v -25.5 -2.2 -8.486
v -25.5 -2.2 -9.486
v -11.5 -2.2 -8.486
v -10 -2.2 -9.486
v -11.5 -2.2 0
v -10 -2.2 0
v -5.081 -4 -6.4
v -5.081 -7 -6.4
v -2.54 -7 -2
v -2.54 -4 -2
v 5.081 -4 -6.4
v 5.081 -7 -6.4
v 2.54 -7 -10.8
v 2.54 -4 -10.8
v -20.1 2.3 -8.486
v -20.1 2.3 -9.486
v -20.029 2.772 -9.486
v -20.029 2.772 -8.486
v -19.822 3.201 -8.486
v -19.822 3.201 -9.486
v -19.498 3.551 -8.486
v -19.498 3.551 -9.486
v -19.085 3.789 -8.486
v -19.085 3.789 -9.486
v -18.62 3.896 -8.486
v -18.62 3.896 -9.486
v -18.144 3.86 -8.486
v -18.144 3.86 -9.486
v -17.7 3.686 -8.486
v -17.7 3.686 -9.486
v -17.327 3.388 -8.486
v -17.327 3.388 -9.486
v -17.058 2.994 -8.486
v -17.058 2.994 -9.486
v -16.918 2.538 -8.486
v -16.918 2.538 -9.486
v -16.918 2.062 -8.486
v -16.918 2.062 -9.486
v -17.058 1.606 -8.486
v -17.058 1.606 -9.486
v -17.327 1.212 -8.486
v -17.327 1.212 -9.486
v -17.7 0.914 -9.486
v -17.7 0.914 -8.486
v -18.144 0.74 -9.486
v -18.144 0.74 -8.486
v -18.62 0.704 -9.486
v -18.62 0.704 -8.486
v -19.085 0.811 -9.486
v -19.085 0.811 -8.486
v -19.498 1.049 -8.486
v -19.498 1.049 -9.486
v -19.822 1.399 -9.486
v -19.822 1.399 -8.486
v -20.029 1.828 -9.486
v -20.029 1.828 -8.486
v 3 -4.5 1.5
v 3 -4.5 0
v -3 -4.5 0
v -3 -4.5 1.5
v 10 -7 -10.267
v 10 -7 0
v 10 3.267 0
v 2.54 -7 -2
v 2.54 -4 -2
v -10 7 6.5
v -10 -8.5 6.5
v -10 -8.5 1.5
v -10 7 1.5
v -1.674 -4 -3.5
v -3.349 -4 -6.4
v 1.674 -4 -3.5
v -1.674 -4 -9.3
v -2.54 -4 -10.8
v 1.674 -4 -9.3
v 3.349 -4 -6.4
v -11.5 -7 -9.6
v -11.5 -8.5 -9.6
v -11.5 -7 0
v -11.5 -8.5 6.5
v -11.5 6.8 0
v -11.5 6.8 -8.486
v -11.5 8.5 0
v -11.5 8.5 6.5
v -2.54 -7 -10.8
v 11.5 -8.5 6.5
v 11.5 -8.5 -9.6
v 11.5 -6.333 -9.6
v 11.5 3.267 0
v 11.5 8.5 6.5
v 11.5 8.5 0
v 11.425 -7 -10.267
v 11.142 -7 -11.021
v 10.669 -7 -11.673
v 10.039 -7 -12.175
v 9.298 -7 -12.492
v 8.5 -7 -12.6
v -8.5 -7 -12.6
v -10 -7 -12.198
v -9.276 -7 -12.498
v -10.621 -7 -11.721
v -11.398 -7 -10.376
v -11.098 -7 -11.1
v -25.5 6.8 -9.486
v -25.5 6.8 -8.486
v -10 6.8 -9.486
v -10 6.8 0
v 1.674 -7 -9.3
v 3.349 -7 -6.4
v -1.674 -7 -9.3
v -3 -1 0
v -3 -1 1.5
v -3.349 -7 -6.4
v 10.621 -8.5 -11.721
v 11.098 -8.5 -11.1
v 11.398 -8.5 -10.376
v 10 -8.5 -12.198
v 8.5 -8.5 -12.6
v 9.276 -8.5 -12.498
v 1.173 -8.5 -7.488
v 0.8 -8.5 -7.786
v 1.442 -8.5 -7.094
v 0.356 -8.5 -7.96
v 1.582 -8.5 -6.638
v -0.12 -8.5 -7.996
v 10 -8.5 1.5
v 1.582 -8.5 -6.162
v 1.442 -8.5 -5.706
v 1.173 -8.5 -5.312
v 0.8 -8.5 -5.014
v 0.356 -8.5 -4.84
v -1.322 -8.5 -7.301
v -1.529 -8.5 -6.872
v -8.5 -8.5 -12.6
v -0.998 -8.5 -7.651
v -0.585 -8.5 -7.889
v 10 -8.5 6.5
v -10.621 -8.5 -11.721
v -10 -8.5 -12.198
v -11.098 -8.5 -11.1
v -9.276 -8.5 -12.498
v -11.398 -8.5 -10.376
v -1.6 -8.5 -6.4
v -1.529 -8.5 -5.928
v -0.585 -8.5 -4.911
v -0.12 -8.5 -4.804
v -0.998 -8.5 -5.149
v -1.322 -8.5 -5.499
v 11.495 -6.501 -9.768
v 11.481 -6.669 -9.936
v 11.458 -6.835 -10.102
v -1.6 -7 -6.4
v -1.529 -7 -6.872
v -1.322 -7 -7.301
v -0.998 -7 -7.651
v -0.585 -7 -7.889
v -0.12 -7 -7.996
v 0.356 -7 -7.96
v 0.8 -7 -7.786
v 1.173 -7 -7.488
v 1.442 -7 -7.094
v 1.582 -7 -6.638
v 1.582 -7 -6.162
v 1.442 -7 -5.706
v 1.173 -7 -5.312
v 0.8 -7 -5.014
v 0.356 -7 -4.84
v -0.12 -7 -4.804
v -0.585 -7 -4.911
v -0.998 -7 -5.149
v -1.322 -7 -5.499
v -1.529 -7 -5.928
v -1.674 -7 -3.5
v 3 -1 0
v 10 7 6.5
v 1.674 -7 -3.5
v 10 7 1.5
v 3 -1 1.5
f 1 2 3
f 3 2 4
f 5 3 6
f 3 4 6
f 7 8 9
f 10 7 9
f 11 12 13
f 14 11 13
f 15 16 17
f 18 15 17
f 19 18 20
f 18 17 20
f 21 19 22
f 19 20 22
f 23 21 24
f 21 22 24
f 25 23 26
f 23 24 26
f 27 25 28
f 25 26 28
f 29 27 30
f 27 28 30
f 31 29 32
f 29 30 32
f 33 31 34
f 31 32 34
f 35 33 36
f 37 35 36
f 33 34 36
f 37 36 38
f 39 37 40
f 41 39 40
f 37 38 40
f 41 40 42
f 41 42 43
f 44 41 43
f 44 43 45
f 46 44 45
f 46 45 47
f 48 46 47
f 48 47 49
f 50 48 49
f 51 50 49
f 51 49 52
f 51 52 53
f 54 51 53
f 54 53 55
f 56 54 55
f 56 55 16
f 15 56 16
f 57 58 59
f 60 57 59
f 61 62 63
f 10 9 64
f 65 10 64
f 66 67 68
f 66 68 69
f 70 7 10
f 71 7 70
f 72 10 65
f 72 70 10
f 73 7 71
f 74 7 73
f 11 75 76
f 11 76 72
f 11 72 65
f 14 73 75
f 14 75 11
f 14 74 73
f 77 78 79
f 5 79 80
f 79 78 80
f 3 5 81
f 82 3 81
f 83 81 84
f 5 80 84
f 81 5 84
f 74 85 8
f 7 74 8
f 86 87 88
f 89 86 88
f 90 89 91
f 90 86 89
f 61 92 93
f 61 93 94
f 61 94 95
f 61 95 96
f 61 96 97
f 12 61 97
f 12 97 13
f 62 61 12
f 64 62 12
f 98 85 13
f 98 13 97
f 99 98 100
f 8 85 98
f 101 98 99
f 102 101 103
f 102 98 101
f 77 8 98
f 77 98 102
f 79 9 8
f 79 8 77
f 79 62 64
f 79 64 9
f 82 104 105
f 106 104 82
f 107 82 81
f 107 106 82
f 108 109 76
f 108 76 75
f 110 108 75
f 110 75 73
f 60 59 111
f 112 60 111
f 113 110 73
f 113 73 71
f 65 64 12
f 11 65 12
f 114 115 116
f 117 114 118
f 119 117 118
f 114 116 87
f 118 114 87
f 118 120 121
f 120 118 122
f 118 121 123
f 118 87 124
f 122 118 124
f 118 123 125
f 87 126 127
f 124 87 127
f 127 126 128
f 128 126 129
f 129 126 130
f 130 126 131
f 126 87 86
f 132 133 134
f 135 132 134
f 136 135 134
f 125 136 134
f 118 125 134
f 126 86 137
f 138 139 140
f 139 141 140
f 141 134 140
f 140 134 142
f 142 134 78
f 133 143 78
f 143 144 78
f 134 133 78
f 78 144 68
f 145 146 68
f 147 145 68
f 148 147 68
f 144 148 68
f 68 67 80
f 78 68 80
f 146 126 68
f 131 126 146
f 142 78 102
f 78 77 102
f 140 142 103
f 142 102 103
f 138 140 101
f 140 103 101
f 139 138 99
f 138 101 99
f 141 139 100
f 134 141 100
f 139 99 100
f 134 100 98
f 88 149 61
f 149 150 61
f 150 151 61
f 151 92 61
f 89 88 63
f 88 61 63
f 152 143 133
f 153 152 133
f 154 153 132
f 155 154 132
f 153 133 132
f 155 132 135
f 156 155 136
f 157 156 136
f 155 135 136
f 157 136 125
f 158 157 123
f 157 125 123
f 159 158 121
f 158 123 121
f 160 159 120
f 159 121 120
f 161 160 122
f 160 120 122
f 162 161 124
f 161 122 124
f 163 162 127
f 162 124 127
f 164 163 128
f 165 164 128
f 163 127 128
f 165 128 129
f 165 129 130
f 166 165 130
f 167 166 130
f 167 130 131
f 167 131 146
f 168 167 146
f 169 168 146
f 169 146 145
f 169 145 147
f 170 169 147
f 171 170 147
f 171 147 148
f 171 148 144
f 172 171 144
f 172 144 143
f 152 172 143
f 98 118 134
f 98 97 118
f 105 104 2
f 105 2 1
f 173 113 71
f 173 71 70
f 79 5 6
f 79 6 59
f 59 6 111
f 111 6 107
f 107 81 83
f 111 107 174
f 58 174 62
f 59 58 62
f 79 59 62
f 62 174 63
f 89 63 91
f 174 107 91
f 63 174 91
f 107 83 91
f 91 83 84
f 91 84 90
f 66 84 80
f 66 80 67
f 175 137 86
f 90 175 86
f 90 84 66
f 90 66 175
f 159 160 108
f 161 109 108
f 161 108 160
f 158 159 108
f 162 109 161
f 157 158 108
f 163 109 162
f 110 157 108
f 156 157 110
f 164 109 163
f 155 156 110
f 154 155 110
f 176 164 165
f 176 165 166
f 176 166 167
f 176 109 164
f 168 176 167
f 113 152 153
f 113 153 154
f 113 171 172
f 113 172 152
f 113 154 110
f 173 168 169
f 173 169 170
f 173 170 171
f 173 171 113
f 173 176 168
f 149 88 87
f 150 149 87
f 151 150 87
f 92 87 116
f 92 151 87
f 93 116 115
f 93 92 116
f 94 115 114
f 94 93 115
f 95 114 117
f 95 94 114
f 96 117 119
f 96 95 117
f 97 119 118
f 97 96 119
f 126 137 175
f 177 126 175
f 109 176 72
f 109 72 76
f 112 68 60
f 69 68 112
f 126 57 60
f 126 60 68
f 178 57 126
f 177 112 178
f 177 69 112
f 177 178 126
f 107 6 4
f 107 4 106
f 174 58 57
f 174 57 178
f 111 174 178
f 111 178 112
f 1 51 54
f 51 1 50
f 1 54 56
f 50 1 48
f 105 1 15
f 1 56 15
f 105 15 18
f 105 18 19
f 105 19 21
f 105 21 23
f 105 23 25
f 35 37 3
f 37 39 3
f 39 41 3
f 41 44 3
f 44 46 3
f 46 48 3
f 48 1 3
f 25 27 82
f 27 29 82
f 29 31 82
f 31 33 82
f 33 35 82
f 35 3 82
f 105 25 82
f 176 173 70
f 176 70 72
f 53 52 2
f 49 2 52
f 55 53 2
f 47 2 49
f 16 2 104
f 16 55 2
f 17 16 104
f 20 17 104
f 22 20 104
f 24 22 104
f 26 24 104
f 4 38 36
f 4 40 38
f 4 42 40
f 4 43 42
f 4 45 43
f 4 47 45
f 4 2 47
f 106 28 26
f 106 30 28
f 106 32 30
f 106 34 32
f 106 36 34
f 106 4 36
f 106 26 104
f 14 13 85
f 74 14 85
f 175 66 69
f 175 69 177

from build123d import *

# Parameters (mm, degrees)
SKETCH_1_W          = 23
SKETCH_1_H          = 17
EXTRUDE_1_DEPTH     = 6.5
SKETCH_2_W          = 20
SKETCH_2_H          = 15.5
CUT_EXTRUDE_1_DEPTH = 5
SKETCH_3_W          = 23
SKETCH_3_H          = 1.5
EXTRUDE_2_DEPTH     = 12.6
EXTRUDE_3_DEPTH     = 3
HOLE_WIZARD_M3_1_D  = 3.2
EXTRUDE_START       = 10
EXTRUDE_6_DEPTH     = 1.5
FILLET_1_R          = 3
SKETCH_10_W         = 1.5
SKETCH_10_H         = 9
EXTRUDE_7_DEPTH     = 9.486304789
SKETCH_11_W         = 1
SKETCH_11_H         = 9
EXTRUDE_8_DEPTH     = 14
HOLE_WIZARD_M3_2_D  = 3.2
CUT_EXTRUDE_2_REACH = 31.686
SKETCH_14_W         = 6
SKETCH_14_H         = 3.5


# Read off the part's stored shape, not the designer's step: 凸台-拉伸6
with BuildPart() as part:
    # 草图1 → 凸台-拉伸1 (new body)
    with BuildSketch(Plane.XY):
        Rectangle(SKETCH_1_W, SKETCH_1_H)
    extrude(amount=EXTRUDE_1_DEPTH)

    # 草图2 → 切除-拉伸1 (cut)
    with BuildSketch(Plane.XY.offset(6.5)):
        with Locations((0, -0.75)):
            Rectangle(SKETCH_2_W, SKETCH_2_H)
    extrude(amount=-CUT_EXTRUDE_1_DEPTH, mode=Mode.SUBTRACT)

    # 草图3 → 凸台-拉伸2 (add)
    with BuildSketch(Plane(origin=(0, 0, 0), x_dir=(-1, 0, 0), z_dir=(0, 0, -1))):
        with Locations((0, -7.75)):
            Rectangle(SKETCH_3_W, SKETCH_3_H)
    extrude(amount=EXTRUDE_2_DEPTH)

    # 草图4 → 凸台-拉伸3 (add)
    with BuildSketch(Plane(origin=(0, -7, 0), x_dir=(1, 0, 0), z_dir=(0, 1, 0))):
        Polygon((5.080682369, 6.4), (2.540341184, 10.8), (-2.540341184, 10.8), (-5.080682369, 6.4), (-2.540341184, 2), (2.540341184, 2), align=None)
        Polygon((3.348631561, 6.4), (1.674315781, 9.3), (-1.674315781, 9.3), (-3.348631561, 6.4), (-1.674315781, 3.5), (1.674315781, 3.5), align=None, mode=Mode.SUBTRACT)
    extrude(amount=EXTRUDE_3_DEPTH)

    # M3 间隙孔1 (through all)
    with Locations(Plane(origin=(0, -7, 0), x_dir=(1, 0, 0), z_dir=(0, 1, 0))):
        with Locations((0, 6.4)):
            Hole(HOLE_WIZARD_M3_1_D / 2)

    # 凸台-拉伸6 outline → 凸台-拉伸6 (add)
    with BuildSketch(Plane.YZ.offset(EXTRUDE_START)):
        Polygon((-7, -10.266991259), (3.266991259, 0), (-7, 0), align=None)
    extrude(amount=EXTRUDE_6_DEPTH)

    # 圆角1
    fillet_1_edges = [part.edges().sort_by_distance(p)[0] for p in [
        (-11.5, -7.75, -12.6),
        (11.5, -7.75, -12.6),
    ]]
    fillet(fillet_1_edges, radius=FILLET_1_R)

    # 草图10 → 凸台-拉伸7 (add)
    with BuildSketch(Plane(origin=(0, 0, 0), x_dir=(-1, 0, 0), z_dir=(0, 0, -1))):
        with Locations((10.75, 2.3)):
            Rectangle(SKETCH_10_W, SKETCH_10_H)
    extrude(amount=EXTRUDE_7_DEPTH)

    # 草图11 → 凸台-拉伸8 (add)
    with BuildSketch(Plane.ZY.offset(11.5)):
        with Locations((-8.986304789, 2.3)):
            Rectangle(SKETCH_11_W, SKETCH_11_H)
    extrude(amount=EXTRUDE_8_DEPTH)

    # M3 间隙孔2 (through all)
    with Locations(Plane.XY.offset(-8.486304789)):
        with Locations((-18.5, 2.3)):
            Hole(HOLE_WIZARD_M3_2_D / 2)

    # 草图14 → 切除-拉伸2 (cut, up to next)
    with BuildSketch(Plane(origin=(0, 0, 0), x_dir=(-1, 0, 0), z_dir=(0, 0, -1)), mode=Mode.PRIVATE) as cut_extrude_2_sk1:
        with Locations((0, -2.75)):
            Rectangle(SKETCH_14_W, SKETCH_14_H)
    cut_extrude_2_tool1 = extrude(cut_extrude_2_sk1.sketch, amount=-CUT_EXTRUDE_2_REACH, mode=Mode.PRIVATE) & part.part
    add(cut_extrude_2_tool1.solids().sort_by_distance((0, -2.75, 0))[0], mode=Mode.SUBTRACT)


solid = part.part
